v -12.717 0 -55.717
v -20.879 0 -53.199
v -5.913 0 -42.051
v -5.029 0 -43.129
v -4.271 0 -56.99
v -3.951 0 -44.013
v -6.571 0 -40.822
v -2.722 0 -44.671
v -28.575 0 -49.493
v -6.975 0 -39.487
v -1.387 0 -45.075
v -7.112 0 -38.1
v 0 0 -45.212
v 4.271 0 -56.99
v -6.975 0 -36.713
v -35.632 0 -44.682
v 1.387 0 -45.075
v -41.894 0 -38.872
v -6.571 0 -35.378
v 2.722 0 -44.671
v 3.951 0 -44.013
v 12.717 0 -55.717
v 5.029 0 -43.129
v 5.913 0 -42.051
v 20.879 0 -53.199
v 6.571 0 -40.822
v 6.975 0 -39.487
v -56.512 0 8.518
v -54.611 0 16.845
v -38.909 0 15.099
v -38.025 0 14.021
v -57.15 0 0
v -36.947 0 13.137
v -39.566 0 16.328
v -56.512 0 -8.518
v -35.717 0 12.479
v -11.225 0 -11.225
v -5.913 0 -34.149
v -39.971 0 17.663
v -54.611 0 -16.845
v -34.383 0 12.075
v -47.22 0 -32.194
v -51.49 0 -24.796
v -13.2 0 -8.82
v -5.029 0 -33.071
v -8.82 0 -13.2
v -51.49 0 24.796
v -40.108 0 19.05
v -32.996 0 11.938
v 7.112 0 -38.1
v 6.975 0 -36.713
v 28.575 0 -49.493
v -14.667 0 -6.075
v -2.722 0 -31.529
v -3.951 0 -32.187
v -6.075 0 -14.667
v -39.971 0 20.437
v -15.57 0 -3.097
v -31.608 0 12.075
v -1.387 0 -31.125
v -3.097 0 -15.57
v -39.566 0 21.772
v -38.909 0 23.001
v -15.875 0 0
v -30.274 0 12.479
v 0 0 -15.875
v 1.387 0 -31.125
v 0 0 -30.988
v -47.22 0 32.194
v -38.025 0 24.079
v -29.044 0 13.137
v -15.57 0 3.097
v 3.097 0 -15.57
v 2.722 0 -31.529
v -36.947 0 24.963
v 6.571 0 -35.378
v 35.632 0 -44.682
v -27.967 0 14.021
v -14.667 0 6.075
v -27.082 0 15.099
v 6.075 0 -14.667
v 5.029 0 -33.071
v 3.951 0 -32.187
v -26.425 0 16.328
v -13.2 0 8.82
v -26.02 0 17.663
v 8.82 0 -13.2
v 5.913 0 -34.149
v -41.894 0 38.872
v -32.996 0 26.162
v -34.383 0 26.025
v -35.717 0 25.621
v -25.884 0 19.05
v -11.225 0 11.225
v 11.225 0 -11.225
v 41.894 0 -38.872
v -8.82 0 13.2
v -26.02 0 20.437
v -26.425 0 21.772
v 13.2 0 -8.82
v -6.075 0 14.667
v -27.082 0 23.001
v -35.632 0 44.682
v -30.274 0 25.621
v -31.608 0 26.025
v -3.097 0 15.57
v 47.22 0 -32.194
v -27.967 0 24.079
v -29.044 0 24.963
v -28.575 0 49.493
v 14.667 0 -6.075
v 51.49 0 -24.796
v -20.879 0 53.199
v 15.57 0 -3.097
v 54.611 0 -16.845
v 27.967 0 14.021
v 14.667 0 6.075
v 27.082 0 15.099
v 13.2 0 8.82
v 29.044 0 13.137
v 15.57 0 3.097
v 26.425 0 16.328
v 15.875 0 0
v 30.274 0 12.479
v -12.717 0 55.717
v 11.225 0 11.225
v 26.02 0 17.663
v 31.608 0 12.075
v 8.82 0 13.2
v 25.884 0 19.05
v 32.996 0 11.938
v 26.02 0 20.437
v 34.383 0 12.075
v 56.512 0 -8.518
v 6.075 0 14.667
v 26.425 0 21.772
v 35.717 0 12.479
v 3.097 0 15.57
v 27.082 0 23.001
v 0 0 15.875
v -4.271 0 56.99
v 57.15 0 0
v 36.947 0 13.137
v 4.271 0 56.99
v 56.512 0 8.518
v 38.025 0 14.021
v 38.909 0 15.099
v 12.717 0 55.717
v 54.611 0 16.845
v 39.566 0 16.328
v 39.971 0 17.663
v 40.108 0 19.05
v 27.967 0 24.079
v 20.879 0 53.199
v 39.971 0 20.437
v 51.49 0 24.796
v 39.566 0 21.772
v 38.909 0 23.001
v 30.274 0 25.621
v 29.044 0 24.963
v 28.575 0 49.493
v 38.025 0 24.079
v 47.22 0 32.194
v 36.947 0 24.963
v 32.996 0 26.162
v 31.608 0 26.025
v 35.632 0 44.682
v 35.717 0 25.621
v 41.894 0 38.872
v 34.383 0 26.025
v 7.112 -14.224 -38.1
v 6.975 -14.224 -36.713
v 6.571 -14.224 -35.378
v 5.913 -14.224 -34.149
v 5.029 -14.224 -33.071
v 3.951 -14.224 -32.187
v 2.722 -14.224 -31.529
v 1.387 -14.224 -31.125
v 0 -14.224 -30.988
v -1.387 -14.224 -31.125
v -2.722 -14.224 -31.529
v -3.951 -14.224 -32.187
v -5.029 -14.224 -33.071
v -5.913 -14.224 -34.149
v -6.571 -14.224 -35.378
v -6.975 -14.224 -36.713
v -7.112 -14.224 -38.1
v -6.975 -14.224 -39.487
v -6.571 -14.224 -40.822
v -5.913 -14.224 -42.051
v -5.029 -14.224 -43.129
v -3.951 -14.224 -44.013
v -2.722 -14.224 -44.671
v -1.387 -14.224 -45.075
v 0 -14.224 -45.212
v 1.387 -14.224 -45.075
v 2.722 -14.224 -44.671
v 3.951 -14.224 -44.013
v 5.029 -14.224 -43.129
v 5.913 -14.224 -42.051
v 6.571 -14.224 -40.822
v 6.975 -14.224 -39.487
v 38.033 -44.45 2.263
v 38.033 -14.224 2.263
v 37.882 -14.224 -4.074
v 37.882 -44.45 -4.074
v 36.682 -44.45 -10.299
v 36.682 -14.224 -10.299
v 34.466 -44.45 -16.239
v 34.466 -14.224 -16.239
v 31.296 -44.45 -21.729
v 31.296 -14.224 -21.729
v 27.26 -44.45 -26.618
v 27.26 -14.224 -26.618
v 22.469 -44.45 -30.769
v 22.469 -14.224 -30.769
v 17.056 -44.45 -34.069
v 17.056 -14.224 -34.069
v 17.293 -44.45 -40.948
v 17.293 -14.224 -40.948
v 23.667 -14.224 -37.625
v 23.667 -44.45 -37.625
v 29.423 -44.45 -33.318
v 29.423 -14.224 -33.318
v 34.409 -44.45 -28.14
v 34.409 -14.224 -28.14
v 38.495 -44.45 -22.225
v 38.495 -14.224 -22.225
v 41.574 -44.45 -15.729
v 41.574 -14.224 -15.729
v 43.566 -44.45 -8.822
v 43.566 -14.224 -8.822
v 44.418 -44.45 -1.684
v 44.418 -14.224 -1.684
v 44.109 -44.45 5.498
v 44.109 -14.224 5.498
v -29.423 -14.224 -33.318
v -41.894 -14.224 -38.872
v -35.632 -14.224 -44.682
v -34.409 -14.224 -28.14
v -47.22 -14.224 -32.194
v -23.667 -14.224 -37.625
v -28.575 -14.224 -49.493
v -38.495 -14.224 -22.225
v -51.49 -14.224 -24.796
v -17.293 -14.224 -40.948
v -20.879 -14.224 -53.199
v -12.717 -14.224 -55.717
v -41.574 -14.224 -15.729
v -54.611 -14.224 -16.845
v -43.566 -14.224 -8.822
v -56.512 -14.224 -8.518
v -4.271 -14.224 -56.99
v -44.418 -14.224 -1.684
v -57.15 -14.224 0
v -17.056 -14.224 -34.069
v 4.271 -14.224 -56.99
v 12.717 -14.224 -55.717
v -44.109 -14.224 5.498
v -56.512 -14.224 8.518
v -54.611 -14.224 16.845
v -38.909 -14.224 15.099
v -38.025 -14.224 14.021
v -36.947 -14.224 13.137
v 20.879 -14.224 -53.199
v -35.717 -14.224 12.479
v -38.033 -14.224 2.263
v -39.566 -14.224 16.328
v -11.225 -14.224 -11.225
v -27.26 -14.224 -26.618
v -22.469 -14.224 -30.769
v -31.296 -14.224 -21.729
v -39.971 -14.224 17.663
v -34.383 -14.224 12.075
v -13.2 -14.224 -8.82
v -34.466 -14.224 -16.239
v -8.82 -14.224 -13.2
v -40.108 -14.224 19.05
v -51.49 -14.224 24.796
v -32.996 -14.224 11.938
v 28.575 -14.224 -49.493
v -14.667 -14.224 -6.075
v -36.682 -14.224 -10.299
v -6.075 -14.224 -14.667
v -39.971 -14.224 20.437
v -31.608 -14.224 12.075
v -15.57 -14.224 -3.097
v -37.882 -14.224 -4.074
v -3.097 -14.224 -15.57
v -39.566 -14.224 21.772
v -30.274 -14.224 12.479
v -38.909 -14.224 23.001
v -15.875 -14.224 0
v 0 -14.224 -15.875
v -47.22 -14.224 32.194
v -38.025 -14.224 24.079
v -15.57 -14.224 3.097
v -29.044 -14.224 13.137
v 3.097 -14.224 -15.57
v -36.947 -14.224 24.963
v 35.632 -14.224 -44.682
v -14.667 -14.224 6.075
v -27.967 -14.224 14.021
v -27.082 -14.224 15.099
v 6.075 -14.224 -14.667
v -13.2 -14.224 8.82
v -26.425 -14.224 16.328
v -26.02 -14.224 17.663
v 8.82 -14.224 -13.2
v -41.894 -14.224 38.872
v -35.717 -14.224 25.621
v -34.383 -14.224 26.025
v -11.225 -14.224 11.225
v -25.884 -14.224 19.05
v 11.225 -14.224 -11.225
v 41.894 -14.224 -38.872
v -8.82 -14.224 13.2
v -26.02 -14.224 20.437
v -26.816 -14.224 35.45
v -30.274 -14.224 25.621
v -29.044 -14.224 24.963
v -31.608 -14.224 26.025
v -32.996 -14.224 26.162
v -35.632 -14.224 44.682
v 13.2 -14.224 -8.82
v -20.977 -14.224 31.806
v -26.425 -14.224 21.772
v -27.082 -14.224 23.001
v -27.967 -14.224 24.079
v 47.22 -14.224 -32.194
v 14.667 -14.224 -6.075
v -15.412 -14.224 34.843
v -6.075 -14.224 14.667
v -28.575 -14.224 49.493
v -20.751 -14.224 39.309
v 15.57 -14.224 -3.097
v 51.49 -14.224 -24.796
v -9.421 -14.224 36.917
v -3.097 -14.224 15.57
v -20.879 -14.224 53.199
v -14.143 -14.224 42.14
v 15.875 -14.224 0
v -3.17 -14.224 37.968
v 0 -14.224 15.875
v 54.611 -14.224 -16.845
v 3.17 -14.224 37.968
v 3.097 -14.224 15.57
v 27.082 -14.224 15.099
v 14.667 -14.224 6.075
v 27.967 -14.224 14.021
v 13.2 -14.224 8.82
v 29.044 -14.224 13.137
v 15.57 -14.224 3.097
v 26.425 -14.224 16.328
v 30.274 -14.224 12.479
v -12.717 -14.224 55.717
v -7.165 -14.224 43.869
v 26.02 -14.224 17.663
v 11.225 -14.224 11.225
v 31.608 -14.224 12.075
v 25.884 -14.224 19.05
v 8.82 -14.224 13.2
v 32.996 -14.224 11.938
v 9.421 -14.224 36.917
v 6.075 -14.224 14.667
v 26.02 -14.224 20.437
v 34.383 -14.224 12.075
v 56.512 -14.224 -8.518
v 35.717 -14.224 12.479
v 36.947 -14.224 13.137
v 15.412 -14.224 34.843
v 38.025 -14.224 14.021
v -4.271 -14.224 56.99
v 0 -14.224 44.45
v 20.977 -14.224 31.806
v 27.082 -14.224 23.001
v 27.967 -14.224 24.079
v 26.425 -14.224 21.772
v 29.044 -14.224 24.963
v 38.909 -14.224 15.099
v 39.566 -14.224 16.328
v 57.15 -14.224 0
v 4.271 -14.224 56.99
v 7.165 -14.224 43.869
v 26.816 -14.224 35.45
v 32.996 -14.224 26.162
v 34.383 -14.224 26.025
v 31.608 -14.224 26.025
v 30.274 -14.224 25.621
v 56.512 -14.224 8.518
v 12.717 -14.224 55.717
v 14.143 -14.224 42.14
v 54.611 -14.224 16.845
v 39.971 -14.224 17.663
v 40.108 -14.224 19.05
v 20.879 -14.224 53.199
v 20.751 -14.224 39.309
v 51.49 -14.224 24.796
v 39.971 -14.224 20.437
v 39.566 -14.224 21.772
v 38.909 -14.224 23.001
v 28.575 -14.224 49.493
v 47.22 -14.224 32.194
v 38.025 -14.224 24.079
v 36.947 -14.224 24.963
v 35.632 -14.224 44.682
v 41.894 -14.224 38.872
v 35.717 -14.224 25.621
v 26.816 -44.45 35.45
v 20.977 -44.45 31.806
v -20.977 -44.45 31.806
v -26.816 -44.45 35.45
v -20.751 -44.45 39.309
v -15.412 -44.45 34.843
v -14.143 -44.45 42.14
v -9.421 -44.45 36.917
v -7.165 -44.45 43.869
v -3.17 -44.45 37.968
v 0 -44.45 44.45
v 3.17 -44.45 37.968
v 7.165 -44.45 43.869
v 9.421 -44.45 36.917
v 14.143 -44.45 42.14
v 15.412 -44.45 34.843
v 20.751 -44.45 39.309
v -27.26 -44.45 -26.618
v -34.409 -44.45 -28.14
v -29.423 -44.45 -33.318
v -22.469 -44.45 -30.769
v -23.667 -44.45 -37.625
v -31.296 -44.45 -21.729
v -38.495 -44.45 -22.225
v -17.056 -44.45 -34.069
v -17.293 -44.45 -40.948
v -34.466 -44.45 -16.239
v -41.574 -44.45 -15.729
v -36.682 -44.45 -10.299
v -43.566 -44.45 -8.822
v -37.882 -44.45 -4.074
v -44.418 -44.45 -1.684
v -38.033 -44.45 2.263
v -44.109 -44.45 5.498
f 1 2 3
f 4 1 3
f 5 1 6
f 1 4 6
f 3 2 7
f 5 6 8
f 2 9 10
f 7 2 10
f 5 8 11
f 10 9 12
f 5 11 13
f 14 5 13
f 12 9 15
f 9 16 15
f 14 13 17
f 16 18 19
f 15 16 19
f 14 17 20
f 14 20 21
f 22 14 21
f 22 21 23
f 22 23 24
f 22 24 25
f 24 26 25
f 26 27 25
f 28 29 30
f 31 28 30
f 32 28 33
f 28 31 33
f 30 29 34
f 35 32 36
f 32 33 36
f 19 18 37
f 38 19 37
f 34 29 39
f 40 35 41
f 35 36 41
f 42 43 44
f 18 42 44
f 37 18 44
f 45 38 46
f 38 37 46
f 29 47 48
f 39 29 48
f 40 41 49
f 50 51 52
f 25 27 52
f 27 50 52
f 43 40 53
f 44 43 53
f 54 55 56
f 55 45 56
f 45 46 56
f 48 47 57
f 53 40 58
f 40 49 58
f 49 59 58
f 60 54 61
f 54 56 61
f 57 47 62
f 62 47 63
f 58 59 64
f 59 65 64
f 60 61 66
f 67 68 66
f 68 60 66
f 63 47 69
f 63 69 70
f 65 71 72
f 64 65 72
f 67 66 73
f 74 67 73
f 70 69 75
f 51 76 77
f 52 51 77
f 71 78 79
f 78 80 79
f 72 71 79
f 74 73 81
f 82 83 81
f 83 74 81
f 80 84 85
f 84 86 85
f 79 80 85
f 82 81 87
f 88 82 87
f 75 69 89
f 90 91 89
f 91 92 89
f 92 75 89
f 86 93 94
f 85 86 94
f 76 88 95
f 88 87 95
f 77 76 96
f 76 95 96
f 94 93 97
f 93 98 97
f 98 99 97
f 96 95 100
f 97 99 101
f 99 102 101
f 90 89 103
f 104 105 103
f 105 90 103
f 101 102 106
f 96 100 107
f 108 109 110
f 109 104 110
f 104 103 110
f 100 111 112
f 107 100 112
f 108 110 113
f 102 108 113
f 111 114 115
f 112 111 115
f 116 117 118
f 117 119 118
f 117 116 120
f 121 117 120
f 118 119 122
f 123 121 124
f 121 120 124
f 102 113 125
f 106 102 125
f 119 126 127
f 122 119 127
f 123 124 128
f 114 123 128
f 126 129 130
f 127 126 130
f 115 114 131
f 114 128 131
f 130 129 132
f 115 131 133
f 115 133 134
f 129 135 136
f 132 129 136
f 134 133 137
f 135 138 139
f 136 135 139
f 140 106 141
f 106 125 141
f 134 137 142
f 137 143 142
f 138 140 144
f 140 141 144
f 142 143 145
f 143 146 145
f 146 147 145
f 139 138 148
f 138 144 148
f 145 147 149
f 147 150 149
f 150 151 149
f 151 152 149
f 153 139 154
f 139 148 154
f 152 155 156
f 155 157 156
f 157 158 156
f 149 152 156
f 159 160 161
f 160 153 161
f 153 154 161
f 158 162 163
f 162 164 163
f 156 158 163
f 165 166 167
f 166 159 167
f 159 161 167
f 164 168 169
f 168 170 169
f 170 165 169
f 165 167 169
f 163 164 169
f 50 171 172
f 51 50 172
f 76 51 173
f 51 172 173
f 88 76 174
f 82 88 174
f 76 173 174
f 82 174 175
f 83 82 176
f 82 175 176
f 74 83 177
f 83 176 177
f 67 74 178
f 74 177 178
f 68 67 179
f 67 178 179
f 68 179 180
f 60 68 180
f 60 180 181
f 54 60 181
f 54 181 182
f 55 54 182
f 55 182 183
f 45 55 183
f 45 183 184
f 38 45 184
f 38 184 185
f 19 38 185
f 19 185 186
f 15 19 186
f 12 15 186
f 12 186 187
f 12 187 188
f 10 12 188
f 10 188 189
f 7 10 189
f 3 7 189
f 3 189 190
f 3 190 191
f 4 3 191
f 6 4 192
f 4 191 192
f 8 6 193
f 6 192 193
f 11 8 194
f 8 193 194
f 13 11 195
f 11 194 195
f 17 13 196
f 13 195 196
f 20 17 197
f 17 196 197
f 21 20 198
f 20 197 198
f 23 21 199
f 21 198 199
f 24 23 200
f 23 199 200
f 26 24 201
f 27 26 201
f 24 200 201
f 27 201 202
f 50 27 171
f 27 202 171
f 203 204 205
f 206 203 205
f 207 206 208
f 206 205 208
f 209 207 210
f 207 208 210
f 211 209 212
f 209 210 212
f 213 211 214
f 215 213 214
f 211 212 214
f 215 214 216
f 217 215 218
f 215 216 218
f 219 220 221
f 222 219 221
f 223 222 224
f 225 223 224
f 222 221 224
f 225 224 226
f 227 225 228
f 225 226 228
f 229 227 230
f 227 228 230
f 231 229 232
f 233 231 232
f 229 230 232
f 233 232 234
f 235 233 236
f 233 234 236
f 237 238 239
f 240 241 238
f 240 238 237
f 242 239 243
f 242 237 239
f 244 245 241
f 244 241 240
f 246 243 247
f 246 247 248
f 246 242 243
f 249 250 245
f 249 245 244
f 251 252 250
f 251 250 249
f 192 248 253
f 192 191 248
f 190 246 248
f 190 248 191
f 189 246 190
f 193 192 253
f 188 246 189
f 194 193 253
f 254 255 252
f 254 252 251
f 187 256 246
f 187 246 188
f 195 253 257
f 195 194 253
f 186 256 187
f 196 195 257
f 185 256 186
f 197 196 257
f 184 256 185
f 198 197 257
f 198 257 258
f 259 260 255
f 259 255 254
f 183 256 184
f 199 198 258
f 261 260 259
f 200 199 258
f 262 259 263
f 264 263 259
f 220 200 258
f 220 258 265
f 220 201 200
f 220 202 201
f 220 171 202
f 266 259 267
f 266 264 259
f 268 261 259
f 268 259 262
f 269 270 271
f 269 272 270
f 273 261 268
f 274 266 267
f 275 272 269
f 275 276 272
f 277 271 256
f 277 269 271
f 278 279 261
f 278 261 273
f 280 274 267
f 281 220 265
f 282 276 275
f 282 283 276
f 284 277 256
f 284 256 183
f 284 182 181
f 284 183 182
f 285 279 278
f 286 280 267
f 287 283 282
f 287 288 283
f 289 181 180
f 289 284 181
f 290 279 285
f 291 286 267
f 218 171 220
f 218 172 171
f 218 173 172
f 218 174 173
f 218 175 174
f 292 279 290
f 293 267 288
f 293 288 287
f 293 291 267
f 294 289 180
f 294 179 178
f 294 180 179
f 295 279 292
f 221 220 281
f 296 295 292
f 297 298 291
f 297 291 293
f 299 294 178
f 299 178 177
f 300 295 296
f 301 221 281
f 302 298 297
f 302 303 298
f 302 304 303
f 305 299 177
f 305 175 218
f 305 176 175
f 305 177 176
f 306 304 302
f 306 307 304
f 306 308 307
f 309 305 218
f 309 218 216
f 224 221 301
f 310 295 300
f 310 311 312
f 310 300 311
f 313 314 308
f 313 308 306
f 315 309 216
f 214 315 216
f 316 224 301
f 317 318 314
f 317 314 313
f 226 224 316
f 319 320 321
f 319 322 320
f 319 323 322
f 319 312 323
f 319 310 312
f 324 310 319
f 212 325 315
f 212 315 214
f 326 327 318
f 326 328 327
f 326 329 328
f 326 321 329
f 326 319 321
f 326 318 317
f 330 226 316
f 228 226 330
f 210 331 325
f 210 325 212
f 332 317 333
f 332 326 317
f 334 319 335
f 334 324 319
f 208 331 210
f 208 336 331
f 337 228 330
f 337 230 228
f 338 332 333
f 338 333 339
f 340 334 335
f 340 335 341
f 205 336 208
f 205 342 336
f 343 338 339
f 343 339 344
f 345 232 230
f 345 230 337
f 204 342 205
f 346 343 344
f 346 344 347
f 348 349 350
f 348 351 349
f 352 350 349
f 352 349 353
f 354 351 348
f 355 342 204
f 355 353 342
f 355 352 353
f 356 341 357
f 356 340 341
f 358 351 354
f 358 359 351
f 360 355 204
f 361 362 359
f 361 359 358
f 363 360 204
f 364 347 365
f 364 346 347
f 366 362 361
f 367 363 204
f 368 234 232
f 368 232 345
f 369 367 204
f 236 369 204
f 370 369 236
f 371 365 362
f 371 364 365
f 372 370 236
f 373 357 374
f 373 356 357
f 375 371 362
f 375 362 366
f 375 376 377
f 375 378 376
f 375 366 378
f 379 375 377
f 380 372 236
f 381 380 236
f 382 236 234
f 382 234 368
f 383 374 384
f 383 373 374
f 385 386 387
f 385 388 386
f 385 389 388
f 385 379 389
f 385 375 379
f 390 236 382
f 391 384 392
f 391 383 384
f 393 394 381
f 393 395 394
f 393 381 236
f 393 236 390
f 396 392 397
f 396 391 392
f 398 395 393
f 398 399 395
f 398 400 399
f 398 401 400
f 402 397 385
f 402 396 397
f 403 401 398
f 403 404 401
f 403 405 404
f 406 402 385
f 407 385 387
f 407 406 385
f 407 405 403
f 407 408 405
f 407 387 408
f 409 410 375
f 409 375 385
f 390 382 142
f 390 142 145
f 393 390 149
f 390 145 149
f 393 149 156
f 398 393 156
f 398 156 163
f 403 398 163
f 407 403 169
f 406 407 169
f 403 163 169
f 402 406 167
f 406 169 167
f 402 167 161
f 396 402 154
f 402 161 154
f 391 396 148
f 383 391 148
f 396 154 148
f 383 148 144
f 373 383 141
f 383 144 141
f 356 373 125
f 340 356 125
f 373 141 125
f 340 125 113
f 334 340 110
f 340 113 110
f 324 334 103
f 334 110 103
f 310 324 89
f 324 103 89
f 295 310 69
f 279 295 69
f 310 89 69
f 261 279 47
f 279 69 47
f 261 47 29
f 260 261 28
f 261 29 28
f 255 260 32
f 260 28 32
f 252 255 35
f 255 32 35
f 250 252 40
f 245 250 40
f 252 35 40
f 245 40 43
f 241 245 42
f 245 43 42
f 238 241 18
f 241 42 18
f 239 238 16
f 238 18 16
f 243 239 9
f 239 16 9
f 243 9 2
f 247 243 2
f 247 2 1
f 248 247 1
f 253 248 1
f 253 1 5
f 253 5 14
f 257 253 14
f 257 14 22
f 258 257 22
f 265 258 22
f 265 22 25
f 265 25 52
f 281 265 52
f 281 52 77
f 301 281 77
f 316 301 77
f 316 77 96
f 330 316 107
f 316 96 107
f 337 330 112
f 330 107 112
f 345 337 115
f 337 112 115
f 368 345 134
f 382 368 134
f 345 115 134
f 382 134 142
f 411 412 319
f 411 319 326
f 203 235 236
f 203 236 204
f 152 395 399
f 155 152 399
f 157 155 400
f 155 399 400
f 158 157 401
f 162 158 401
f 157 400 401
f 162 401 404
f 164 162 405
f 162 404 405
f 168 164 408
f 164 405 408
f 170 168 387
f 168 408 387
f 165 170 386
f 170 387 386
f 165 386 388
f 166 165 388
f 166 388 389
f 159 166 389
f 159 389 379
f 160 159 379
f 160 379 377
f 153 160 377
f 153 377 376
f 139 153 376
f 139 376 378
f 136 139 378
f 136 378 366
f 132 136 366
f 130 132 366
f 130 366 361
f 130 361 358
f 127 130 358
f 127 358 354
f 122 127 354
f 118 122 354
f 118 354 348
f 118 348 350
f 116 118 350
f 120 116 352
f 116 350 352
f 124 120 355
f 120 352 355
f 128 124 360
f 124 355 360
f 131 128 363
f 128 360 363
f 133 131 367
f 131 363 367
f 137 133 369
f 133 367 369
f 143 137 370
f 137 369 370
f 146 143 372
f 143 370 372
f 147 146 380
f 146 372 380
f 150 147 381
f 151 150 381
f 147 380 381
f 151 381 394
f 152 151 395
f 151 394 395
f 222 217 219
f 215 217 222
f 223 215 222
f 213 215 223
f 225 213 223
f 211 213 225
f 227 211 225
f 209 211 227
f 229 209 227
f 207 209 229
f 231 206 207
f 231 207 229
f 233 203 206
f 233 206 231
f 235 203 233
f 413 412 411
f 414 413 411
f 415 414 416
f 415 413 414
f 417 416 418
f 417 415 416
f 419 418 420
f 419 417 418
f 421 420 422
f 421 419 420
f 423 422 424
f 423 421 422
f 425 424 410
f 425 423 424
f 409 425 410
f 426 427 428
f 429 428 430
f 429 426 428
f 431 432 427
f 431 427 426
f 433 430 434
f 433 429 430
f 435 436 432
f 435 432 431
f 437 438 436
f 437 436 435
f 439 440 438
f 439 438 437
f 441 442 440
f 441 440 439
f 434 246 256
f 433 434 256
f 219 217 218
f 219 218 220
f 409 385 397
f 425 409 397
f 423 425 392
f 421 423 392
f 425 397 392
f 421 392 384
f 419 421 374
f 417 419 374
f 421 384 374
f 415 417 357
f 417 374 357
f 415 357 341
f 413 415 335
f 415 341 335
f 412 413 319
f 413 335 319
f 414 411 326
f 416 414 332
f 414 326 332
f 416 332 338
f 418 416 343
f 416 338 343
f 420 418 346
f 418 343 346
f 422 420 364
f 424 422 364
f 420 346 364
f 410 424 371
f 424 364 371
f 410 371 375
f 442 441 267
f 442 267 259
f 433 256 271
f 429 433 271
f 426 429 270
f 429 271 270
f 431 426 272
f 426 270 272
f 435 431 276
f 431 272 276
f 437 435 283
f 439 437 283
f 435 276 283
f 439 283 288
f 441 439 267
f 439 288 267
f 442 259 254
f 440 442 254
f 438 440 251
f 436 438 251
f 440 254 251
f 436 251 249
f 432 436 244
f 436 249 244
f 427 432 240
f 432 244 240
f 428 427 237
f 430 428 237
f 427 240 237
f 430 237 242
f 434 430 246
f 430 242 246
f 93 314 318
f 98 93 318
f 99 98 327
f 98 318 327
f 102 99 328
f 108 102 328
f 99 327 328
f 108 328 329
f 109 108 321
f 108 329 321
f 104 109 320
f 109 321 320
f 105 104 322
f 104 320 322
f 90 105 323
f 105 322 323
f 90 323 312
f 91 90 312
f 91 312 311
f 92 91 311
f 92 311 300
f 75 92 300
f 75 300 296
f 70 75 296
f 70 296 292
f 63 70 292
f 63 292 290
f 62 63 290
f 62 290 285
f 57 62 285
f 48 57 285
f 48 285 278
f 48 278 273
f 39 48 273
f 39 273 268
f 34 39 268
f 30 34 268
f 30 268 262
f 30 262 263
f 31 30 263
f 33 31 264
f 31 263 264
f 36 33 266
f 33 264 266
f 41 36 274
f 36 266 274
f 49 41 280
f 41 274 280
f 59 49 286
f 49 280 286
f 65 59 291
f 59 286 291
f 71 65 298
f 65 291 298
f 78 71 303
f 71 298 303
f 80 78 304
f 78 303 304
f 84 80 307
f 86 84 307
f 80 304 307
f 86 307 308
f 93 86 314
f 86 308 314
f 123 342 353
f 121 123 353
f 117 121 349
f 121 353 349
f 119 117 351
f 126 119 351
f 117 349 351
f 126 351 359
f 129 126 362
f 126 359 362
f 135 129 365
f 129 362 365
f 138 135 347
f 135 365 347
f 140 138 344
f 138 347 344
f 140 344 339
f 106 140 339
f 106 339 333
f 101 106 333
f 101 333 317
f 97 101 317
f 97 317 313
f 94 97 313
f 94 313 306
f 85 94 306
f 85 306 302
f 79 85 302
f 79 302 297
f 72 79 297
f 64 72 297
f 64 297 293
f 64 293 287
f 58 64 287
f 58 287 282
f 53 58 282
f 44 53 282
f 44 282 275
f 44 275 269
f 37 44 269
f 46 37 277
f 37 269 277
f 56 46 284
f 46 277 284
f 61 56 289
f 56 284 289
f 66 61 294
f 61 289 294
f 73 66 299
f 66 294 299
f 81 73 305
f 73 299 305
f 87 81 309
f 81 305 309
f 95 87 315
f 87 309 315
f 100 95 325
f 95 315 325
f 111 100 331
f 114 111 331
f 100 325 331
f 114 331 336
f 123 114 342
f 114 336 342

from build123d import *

# Parameters (mm, degrees)
F0_R     = 57.15
F1_DEPTH = 14.224
F2_R     = 15.875
F3_DEPTH = 25.4
F4_R     = 7.112
F5_DEPTH = 25.4
F7_DEPTH = 30.226


with BuildPart() as f1:
    # F0 (on Front) → F1 (new body)
    with BuildSketch(Plane.XZ):
        Circle(F0_R)
    extrude(amount=F1_DEPTH)

    # F2 (on face) → F3 (cut)
    with BuildSketch(Plane.XZ.offset(14.224)):
        Circle(F2_R)
    extrude(amount=-F3_DEPTH, mode=Mode.SUBTRACT)

    # F4 (on face) → F5 (cut)
    with BuildSketch(Plane.XZ.offset(14.224)):
        with Locations((0, -38.1)):
            Circle(F4_R)
        with Locations((32.995568, 19.05)):
            Circle(F4_R)
        with Locations((-32.995568, 19.05)):
            Circle(F4_R)
    extrude(amount=-F5_DEPTH, mode=Mode.SUBTRACT)

    # F6 (on face) → F7 (join)
    with BuildSketch(Plane.XZ.offset(14.224)):
        with BuildLine():
            Line((-38.032706, 2.26346), (-44.108679, 5.4979))
            ThreePointArc((-44.108679, 5.4979), (-38.494829, -22.225), (-17.293019, -40.948187))
            Line((-17.293019, -40.948187), (-17.056139, -34.06902))
            ThreePointArc((-17.056139, -34.06902), (-32.995568, -19.05), (-38.032706, 2.26346))
        make_face()
        with BuildLine():
            ThreePointArc((-20.976567, 31.80556), (0, 38.1), (20.976567, 31.80556))
            Line((20.976567, 31.80556), (26.81566, 35.450287))
            ThreePointArc((26.81566, 35.450287), (0, 44.45), (-26.81566, 35.450287))
            Line((-26.81566, 35.450287), (-20.976567, 31.80556))
        make_face()
        with BuildLine():
            Line((17.056139, -34.06902), (17.293019, -40.948187))
            ThreePointArc((17.293019, -40.948187), (38.494829, -22.225), (44.108679, 5.4979))
            Line((44.108679, 5.4979), (38.032706, 2.26346))
            ThreePointArc((38.032706, 2.26346), (32.995568, -19.05), (17.056139, -34.06902))
        make_face()
    extrude(amount=F7_DEPTH)


solid = f1.part
